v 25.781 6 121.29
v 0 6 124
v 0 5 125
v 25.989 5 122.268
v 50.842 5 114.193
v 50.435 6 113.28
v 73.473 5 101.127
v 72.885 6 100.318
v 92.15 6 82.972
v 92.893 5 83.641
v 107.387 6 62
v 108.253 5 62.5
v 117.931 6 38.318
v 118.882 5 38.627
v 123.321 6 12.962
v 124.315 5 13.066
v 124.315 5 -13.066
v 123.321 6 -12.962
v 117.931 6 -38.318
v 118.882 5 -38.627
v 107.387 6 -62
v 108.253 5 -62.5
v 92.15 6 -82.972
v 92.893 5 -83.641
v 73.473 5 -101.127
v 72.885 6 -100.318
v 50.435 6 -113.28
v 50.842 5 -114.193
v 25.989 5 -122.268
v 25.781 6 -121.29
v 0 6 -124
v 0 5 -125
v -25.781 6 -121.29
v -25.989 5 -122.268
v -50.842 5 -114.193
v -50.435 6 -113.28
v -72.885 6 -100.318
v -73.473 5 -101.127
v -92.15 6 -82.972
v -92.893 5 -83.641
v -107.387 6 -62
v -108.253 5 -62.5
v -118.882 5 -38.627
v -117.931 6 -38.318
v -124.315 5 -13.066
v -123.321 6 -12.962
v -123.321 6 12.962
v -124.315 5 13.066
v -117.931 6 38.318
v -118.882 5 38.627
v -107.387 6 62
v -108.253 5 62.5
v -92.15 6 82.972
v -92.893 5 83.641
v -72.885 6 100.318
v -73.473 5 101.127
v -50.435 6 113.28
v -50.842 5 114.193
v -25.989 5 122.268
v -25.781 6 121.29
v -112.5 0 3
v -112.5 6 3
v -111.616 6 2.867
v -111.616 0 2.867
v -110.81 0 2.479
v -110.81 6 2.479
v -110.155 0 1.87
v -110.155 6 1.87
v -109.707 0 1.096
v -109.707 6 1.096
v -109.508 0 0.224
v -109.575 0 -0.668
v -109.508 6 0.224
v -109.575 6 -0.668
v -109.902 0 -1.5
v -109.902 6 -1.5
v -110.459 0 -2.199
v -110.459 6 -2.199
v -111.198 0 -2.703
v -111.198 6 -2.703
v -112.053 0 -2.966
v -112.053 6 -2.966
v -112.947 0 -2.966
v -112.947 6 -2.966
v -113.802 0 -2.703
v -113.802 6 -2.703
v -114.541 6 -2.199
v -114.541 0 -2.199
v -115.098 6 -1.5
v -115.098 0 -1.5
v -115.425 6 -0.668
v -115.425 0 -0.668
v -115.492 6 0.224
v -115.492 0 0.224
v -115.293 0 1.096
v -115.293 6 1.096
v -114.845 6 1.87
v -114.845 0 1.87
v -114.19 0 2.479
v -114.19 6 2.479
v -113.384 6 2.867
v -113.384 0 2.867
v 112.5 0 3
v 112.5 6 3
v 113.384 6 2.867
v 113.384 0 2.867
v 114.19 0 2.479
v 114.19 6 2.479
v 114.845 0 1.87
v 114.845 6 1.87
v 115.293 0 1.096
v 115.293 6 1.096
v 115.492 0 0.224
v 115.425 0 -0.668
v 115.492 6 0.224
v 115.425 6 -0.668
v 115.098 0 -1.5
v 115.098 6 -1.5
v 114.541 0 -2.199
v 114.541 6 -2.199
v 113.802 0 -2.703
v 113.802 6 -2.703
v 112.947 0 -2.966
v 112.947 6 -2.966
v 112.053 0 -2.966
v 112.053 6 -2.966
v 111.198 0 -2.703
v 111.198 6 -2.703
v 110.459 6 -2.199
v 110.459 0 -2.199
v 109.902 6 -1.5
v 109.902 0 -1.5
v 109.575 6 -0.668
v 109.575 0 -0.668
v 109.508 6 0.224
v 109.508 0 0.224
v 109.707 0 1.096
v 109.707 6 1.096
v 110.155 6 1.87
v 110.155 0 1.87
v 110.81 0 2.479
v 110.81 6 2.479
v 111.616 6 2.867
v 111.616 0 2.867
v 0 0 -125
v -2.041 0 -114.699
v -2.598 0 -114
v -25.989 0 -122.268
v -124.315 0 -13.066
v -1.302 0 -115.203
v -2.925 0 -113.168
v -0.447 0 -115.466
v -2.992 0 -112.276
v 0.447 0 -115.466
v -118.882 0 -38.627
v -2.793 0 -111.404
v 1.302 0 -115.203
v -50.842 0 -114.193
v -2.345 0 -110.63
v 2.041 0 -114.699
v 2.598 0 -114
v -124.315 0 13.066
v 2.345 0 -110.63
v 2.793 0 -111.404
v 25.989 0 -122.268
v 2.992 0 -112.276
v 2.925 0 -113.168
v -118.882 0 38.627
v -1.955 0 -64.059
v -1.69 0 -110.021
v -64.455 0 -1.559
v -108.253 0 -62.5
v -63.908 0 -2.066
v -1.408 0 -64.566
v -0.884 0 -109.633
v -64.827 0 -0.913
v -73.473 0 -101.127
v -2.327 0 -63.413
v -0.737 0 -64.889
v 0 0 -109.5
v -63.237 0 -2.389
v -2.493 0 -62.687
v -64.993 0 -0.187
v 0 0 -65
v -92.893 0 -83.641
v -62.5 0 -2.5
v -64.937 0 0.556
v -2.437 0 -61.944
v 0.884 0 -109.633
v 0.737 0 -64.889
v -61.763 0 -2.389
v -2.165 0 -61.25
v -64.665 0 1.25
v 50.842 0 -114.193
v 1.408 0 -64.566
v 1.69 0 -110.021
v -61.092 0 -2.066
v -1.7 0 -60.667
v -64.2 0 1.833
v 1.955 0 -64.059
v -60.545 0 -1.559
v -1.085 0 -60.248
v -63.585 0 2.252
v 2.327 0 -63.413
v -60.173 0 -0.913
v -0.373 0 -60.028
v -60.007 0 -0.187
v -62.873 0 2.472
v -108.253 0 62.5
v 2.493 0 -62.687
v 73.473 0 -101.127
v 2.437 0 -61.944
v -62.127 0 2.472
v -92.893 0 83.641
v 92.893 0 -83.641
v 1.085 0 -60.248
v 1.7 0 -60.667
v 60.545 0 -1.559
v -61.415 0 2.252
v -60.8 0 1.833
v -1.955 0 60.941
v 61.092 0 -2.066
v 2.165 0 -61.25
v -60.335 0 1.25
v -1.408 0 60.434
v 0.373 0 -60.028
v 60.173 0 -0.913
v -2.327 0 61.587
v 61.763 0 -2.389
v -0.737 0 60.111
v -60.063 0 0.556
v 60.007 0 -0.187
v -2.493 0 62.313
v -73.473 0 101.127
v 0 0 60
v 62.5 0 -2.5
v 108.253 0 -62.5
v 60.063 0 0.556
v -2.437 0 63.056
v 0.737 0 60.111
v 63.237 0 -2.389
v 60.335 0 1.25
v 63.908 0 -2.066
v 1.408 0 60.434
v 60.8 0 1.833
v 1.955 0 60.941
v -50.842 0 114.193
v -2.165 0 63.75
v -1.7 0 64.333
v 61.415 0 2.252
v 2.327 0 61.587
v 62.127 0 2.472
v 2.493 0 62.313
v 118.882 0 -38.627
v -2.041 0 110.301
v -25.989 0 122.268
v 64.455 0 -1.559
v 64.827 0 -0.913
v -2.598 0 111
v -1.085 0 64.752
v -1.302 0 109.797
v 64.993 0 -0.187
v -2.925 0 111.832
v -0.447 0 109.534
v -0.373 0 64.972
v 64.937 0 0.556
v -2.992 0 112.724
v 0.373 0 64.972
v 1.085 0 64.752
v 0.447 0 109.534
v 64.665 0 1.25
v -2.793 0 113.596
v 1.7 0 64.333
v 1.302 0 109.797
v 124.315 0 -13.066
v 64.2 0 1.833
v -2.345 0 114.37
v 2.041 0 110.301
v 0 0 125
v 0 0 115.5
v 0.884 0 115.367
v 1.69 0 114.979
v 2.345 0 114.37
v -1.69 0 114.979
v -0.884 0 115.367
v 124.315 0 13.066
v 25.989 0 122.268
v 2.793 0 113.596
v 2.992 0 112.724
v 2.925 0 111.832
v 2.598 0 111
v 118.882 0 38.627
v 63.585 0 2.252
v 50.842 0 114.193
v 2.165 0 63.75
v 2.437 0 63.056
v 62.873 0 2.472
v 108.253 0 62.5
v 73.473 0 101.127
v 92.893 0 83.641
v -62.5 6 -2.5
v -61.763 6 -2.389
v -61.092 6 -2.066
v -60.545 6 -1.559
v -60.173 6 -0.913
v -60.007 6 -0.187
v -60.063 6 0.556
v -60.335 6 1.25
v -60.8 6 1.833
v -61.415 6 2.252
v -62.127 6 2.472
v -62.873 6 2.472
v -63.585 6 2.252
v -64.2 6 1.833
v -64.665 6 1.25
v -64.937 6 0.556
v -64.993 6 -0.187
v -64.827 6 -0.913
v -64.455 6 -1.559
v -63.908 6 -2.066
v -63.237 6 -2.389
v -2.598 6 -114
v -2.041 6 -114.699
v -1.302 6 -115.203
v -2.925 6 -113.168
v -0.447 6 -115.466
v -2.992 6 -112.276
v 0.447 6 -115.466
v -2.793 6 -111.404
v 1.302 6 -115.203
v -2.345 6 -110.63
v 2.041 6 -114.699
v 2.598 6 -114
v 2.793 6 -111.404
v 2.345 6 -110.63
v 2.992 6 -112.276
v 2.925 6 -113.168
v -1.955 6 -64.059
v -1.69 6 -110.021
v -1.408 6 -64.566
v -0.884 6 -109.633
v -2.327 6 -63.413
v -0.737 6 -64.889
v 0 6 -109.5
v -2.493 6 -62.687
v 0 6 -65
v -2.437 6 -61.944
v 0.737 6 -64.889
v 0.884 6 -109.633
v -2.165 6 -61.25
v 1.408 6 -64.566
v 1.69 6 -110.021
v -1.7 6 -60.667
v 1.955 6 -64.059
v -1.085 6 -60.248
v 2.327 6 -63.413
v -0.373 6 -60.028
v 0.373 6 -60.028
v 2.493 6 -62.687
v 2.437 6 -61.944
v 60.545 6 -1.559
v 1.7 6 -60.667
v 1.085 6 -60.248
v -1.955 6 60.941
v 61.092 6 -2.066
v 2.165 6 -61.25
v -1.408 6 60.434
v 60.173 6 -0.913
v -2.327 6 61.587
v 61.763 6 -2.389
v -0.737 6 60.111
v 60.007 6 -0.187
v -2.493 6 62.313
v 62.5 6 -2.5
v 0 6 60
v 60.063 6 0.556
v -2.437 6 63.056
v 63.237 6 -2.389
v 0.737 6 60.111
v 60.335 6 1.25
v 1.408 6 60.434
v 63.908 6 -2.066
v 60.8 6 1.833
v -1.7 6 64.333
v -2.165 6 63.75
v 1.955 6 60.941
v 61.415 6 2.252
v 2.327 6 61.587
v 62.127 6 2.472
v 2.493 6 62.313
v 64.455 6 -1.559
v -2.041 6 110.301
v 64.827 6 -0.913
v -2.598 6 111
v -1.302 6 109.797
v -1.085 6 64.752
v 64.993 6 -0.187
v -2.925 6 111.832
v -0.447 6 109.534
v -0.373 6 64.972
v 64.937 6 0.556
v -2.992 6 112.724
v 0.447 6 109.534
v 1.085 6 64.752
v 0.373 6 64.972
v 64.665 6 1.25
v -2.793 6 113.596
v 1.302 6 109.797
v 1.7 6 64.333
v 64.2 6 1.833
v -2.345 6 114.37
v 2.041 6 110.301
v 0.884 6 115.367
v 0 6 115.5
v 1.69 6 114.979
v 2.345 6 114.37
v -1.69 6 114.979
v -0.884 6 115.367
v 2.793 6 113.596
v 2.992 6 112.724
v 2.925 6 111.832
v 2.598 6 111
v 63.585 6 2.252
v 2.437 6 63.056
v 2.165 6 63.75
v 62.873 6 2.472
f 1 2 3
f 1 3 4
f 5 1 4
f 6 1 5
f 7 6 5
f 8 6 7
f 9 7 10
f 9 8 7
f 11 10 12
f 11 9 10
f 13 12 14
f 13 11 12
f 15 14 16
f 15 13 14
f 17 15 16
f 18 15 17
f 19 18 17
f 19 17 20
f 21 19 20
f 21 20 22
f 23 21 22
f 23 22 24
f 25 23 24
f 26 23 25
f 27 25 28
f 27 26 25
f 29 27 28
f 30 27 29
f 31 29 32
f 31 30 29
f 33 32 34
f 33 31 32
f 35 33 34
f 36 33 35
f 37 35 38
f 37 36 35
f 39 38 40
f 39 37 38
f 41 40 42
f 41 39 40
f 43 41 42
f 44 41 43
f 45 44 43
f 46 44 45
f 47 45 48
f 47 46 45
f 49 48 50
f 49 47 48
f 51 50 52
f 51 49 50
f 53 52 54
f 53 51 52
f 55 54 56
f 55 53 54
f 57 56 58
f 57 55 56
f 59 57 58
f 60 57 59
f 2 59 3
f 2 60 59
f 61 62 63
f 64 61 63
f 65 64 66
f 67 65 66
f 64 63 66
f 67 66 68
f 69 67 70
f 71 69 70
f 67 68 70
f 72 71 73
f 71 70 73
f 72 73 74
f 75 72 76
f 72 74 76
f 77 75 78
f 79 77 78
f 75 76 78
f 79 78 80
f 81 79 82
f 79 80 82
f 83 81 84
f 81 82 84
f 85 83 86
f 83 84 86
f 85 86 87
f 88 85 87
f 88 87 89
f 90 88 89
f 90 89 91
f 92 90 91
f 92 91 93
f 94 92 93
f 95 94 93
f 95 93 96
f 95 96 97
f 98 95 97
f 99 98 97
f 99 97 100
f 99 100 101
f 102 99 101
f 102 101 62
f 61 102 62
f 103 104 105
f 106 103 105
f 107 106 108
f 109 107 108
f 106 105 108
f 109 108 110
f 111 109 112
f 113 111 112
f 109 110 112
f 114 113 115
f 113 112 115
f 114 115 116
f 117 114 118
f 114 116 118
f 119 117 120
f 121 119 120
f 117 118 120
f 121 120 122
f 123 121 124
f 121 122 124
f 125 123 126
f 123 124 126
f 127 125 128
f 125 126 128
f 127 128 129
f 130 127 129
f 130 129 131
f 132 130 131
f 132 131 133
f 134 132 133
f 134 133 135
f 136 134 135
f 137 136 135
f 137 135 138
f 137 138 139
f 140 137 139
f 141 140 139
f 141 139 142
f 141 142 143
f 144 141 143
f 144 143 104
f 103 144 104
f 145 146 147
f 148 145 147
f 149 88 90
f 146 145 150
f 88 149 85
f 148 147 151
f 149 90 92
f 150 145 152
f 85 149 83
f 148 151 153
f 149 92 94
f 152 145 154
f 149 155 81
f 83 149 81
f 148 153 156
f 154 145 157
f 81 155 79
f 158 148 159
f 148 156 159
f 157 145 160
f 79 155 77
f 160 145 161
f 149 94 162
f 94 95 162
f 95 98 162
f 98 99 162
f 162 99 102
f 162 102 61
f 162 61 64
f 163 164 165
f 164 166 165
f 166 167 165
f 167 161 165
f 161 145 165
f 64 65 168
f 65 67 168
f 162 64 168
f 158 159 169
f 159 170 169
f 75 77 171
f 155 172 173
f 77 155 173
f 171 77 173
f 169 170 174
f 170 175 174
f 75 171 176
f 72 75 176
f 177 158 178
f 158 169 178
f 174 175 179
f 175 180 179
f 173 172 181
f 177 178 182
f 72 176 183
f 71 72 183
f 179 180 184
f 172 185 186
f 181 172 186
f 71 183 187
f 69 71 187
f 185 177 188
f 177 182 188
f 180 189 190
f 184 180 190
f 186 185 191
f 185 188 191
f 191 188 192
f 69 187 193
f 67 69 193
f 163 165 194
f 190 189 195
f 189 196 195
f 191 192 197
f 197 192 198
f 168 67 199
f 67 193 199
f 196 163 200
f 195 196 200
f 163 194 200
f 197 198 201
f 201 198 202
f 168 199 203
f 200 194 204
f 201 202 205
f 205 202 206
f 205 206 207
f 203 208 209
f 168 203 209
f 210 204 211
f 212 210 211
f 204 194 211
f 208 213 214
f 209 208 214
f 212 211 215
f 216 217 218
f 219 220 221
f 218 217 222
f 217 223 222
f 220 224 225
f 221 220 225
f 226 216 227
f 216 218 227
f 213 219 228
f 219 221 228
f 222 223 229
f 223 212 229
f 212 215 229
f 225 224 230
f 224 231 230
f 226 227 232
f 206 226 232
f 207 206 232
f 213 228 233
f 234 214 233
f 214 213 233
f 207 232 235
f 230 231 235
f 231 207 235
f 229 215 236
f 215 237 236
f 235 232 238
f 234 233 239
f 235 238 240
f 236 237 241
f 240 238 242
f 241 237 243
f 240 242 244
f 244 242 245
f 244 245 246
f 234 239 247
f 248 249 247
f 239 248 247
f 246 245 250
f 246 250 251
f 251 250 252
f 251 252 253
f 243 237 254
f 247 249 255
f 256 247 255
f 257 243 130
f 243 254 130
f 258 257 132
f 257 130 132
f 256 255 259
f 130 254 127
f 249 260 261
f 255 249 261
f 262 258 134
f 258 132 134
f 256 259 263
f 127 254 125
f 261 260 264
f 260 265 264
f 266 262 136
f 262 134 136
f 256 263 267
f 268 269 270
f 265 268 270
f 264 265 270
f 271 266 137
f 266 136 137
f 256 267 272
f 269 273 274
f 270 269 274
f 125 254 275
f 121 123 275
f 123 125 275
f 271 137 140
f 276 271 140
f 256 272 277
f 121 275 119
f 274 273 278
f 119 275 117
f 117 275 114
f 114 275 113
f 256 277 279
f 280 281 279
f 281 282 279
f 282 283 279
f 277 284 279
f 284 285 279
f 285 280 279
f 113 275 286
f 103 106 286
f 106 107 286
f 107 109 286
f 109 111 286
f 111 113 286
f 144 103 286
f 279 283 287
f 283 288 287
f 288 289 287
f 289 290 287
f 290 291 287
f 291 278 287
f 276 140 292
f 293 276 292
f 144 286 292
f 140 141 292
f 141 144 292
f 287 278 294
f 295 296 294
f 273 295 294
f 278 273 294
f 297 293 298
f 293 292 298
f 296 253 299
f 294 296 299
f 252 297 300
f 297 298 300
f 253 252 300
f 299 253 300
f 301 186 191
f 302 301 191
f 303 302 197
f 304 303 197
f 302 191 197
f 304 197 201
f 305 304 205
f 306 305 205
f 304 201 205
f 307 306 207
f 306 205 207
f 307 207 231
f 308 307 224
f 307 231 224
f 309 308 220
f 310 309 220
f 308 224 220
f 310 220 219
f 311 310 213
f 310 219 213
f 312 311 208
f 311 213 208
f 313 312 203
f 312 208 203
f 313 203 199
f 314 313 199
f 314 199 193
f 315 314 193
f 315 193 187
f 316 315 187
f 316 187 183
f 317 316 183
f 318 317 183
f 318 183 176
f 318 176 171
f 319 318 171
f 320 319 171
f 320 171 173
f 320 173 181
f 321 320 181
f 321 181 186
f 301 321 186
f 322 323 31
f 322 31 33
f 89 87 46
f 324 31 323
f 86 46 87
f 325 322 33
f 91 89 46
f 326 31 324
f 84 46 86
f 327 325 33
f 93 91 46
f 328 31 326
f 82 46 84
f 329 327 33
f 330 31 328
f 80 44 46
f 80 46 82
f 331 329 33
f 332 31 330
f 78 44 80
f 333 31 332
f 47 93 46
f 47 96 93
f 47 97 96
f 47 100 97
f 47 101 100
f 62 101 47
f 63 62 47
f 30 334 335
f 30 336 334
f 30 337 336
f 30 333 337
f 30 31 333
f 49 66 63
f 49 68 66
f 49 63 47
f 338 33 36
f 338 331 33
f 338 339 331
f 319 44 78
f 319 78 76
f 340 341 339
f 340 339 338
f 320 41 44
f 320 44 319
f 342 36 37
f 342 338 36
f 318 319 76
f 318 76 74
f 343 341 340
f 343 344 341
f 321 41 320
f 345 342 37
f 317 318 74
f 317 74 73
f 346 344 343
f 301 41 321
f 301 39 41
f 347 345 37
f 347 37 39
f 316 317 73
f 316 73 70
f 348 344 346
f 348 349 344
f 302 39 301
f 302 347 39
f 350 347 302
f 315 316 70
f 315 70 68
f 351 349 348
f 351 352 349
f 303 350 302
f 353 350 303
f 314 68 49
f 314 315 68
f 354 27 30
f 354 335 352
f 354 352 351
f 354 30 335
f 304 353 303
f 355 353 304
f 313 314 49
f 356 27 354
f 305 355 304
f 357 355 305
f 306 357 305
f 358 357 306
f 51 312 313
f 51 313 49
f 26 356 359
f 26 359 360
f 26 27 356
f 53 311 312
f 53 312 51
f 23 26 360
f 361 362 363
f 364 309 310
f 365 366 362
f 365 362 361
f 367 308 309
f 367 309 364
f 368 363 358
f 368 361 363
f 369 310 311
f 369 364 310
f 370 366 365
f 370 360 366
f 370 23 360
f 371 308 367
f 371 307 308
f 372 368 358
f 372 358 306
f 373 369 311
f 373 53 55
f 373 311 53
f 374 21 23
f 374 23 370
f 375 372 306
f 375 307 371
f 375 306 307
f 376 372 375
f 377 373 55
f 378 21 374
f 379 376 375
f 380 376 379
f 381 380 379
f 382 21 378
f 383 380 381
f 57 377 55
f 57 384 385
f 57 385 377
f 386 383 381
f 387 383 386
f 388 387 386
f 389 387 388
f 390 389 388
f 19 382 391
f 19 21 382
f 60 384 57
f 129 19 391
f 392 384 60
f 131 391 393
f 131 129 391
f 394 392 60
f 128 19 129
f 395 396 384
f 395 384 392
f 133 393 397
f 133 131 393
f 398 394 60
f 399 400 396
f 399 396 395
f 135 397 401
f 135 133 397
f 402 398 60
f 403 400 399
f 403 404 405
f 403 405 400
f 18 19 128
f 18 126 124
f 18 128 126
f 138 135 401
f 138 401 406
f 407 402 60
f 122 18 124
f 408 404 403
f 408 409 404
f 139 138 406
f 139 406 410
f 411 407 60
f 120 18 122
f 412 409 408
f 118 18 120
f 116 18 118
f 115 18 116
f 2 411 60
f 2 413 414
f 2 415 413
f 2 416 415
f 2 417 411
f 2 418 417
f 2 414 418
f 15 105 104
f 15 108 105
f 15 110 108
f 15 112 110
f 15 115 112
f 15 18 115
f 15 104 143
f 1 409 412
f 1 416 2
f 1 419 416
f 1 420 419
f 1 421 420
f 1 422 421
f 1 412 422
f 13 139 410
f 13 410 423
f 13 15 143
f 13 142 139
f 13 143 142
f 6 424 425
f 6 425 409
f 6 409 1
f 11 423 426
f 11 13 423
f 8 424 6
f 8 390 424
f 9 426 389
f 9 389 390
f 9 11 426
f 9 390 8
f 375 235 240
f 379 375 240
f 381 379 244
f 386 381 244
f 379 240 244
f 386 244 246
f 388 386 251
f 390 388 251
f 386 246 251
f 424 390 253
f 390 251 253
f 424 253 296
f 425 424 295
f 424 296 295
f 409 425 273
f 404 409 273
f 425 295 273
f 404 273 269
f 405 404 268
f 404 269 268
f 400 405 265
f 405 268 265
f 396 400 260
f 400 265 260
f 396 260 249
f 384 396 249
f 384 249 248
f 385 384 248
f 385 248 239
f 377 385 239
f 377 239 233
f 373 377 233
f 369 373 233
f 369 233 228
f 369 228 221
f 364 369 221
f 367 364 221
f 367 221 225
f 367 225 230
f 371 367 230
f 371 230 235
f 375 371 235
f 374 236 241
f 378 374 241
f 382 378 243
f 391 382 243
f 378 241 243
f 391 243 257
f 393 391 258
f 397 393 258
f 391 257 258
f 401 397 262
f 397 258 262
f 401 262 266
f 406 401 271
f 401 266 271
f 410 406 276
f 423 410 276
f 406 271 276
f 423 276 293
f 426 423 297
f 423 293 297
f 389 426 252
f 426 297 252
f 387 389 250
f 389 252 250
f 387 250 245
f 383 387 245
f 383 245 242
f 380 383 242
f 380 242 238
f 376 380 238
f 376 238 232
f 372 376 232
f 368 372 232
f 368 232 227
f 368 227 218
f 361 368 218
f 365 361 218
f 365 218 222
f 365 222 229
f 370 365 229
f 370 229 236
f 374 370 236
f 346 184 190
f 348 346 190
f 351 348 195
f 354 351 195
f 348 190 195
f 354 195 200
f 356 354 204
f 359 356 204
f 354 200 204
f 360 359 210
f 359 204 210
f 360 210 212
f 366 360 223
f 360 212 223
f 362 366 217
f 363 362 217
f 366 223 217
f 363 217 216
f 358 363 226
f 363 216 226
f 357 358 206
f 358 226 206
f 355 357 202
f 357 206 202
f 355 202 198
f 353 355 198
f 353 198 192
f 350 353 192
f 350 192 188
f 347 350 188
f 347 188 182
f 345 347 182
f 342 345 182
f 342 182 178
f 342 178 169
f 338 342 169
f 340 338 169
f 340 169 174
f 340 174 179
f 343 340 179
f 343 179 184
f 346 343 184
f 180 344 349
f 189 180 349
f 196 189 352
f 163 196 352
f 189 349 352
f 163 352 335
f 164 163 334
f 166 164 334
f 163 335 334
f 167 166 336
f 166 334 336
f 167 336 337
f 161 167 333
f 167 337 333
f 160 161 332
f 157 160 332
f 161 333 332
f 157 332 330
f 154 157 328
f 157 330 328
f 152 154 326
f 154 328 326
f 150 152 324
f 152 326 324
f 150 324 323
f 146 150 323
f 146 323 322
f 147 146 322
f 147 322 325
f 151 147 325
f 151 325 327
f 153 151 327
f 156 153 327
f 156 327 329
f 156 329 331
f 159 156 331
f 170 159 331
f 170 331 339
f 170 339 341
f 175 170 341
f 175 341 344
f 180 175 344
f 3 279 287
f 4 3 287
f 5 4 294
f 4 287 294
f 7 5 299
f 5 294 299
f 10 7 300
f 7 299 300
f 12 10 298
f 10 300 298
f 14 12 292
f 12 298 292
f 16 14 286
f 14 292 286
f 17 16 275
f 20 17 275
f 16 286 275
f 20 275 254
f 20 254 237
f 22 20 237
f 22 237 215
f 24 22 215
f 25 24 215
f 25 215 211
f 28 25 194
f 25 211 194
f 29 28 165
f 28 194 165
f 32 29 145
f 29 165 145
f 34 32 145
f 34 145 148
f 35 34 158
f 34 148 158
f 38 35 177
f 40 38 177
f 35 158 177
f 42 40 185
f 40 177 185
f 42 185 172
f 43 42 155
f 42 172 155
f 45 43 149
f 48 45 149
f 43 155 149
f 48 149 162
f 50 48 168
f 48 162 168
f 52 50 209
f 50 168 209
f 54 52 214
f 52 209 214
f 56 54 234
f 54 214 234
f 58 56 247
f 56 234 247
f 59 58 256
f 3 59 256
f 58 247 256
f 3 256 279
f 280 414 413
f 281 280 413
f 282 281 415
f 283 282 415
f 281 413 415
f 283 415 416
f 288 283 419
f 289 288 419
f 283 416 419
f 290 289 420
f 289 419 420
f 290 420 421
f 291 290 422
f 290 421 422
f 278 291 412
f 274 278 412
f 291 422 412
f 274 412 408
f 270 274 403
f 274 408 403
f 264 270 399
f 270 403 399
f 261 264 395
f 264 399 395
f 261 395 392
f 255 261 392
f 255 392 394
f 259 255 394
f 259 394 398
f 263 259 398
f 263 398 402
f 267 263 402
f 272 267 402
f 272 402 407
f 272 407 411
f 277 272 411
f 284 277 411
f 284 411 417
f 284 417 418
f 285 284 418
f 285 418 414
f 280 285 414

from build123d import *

# Parameters (mm, degrees)
SKETCH_1_R          = 125
EXTRUDE_1_DEPTH     = 6
SKETCH_3_R          = 3
CUT_EXTRUDE_2_DEPTH = 10
SKETCH_4_R          = 2.5
CUT_EXTRUDE_3_DEPTH = 10
CHAMFER_1_SIZE      = 1


with BuildPart() as part:
    # Эскиз1 → Бобышка-Вытянуть1 (new body)
    with BuildSketch(Plane(origin=(0, 0, 0), x_dir=(1, 0, 0), z_dir=(0, 1, 0))):
        with Locations(Location((0, 0, 0), (0, 0, 270))):
            Circle(SKETCH_1_R)
    extrude(amount=EXTRUDE_1_DEPTH)

    # Эскиз3 → Вырез-Вытянуть2 (cut)
    with BuildSketch(Plane(origin=(0, 6, 0), x_dir=(1, 0, 0), z_dir=(0, 1, 0))):
        with Locations(Location((0, 112.5, 0), (0, 0, 270))):
            Circle(SKETCH_3_R)
        with Locations(Location((-112.5, 0, 0), (0, 0, 270))):
            Circle(SKETCH_3_R)
        with Locations(Location((0, -112.5, 0), (0, 0, 270))):
            Circle(SKETCH_3_R)
        with Locations(Location((112.5, 0, 0), (0, 0, 270))):
            Circle(SKETCH_3_R)
    extrude(amount=-CUT_EXTRUDE_2_DEPTH, mode=Mode.SUBTRACT)

    # Эскиз4 → Вырез-Вытянуть3 (cut)
    with BuildSketch(Plane.XZ):
        with Locations(Location((0, 62.5, 0), (0, 0, 270))):
            Circle(SKETCH_4_R)
        with Locations(Location((0, -62.5, 0), (0, 0, 270))):
            Circle(SKETCH_4_R)
        with Locations(Location((62.5, 0, 0), (0, 0, 270))):
            Circle(SKETCH_4_R)
        with Locations(Location((-62.5, 0, 0), (0, 0, 270))):
            Circle(SKETCH_4_R)
    extrude(amount=-CUT_EXTRUDE_3_DEPTH, mode=Mode.SUBTRACT)

    # Фаска1
    chamfer_1_edges = [part.edges().sort_by_distance(p)[0] for p in [
        (0, 6, -125),
    ]]
    chamfer(chamfer_1_edges, length=CHAMFER_1_SIZE)


solid = part.part
